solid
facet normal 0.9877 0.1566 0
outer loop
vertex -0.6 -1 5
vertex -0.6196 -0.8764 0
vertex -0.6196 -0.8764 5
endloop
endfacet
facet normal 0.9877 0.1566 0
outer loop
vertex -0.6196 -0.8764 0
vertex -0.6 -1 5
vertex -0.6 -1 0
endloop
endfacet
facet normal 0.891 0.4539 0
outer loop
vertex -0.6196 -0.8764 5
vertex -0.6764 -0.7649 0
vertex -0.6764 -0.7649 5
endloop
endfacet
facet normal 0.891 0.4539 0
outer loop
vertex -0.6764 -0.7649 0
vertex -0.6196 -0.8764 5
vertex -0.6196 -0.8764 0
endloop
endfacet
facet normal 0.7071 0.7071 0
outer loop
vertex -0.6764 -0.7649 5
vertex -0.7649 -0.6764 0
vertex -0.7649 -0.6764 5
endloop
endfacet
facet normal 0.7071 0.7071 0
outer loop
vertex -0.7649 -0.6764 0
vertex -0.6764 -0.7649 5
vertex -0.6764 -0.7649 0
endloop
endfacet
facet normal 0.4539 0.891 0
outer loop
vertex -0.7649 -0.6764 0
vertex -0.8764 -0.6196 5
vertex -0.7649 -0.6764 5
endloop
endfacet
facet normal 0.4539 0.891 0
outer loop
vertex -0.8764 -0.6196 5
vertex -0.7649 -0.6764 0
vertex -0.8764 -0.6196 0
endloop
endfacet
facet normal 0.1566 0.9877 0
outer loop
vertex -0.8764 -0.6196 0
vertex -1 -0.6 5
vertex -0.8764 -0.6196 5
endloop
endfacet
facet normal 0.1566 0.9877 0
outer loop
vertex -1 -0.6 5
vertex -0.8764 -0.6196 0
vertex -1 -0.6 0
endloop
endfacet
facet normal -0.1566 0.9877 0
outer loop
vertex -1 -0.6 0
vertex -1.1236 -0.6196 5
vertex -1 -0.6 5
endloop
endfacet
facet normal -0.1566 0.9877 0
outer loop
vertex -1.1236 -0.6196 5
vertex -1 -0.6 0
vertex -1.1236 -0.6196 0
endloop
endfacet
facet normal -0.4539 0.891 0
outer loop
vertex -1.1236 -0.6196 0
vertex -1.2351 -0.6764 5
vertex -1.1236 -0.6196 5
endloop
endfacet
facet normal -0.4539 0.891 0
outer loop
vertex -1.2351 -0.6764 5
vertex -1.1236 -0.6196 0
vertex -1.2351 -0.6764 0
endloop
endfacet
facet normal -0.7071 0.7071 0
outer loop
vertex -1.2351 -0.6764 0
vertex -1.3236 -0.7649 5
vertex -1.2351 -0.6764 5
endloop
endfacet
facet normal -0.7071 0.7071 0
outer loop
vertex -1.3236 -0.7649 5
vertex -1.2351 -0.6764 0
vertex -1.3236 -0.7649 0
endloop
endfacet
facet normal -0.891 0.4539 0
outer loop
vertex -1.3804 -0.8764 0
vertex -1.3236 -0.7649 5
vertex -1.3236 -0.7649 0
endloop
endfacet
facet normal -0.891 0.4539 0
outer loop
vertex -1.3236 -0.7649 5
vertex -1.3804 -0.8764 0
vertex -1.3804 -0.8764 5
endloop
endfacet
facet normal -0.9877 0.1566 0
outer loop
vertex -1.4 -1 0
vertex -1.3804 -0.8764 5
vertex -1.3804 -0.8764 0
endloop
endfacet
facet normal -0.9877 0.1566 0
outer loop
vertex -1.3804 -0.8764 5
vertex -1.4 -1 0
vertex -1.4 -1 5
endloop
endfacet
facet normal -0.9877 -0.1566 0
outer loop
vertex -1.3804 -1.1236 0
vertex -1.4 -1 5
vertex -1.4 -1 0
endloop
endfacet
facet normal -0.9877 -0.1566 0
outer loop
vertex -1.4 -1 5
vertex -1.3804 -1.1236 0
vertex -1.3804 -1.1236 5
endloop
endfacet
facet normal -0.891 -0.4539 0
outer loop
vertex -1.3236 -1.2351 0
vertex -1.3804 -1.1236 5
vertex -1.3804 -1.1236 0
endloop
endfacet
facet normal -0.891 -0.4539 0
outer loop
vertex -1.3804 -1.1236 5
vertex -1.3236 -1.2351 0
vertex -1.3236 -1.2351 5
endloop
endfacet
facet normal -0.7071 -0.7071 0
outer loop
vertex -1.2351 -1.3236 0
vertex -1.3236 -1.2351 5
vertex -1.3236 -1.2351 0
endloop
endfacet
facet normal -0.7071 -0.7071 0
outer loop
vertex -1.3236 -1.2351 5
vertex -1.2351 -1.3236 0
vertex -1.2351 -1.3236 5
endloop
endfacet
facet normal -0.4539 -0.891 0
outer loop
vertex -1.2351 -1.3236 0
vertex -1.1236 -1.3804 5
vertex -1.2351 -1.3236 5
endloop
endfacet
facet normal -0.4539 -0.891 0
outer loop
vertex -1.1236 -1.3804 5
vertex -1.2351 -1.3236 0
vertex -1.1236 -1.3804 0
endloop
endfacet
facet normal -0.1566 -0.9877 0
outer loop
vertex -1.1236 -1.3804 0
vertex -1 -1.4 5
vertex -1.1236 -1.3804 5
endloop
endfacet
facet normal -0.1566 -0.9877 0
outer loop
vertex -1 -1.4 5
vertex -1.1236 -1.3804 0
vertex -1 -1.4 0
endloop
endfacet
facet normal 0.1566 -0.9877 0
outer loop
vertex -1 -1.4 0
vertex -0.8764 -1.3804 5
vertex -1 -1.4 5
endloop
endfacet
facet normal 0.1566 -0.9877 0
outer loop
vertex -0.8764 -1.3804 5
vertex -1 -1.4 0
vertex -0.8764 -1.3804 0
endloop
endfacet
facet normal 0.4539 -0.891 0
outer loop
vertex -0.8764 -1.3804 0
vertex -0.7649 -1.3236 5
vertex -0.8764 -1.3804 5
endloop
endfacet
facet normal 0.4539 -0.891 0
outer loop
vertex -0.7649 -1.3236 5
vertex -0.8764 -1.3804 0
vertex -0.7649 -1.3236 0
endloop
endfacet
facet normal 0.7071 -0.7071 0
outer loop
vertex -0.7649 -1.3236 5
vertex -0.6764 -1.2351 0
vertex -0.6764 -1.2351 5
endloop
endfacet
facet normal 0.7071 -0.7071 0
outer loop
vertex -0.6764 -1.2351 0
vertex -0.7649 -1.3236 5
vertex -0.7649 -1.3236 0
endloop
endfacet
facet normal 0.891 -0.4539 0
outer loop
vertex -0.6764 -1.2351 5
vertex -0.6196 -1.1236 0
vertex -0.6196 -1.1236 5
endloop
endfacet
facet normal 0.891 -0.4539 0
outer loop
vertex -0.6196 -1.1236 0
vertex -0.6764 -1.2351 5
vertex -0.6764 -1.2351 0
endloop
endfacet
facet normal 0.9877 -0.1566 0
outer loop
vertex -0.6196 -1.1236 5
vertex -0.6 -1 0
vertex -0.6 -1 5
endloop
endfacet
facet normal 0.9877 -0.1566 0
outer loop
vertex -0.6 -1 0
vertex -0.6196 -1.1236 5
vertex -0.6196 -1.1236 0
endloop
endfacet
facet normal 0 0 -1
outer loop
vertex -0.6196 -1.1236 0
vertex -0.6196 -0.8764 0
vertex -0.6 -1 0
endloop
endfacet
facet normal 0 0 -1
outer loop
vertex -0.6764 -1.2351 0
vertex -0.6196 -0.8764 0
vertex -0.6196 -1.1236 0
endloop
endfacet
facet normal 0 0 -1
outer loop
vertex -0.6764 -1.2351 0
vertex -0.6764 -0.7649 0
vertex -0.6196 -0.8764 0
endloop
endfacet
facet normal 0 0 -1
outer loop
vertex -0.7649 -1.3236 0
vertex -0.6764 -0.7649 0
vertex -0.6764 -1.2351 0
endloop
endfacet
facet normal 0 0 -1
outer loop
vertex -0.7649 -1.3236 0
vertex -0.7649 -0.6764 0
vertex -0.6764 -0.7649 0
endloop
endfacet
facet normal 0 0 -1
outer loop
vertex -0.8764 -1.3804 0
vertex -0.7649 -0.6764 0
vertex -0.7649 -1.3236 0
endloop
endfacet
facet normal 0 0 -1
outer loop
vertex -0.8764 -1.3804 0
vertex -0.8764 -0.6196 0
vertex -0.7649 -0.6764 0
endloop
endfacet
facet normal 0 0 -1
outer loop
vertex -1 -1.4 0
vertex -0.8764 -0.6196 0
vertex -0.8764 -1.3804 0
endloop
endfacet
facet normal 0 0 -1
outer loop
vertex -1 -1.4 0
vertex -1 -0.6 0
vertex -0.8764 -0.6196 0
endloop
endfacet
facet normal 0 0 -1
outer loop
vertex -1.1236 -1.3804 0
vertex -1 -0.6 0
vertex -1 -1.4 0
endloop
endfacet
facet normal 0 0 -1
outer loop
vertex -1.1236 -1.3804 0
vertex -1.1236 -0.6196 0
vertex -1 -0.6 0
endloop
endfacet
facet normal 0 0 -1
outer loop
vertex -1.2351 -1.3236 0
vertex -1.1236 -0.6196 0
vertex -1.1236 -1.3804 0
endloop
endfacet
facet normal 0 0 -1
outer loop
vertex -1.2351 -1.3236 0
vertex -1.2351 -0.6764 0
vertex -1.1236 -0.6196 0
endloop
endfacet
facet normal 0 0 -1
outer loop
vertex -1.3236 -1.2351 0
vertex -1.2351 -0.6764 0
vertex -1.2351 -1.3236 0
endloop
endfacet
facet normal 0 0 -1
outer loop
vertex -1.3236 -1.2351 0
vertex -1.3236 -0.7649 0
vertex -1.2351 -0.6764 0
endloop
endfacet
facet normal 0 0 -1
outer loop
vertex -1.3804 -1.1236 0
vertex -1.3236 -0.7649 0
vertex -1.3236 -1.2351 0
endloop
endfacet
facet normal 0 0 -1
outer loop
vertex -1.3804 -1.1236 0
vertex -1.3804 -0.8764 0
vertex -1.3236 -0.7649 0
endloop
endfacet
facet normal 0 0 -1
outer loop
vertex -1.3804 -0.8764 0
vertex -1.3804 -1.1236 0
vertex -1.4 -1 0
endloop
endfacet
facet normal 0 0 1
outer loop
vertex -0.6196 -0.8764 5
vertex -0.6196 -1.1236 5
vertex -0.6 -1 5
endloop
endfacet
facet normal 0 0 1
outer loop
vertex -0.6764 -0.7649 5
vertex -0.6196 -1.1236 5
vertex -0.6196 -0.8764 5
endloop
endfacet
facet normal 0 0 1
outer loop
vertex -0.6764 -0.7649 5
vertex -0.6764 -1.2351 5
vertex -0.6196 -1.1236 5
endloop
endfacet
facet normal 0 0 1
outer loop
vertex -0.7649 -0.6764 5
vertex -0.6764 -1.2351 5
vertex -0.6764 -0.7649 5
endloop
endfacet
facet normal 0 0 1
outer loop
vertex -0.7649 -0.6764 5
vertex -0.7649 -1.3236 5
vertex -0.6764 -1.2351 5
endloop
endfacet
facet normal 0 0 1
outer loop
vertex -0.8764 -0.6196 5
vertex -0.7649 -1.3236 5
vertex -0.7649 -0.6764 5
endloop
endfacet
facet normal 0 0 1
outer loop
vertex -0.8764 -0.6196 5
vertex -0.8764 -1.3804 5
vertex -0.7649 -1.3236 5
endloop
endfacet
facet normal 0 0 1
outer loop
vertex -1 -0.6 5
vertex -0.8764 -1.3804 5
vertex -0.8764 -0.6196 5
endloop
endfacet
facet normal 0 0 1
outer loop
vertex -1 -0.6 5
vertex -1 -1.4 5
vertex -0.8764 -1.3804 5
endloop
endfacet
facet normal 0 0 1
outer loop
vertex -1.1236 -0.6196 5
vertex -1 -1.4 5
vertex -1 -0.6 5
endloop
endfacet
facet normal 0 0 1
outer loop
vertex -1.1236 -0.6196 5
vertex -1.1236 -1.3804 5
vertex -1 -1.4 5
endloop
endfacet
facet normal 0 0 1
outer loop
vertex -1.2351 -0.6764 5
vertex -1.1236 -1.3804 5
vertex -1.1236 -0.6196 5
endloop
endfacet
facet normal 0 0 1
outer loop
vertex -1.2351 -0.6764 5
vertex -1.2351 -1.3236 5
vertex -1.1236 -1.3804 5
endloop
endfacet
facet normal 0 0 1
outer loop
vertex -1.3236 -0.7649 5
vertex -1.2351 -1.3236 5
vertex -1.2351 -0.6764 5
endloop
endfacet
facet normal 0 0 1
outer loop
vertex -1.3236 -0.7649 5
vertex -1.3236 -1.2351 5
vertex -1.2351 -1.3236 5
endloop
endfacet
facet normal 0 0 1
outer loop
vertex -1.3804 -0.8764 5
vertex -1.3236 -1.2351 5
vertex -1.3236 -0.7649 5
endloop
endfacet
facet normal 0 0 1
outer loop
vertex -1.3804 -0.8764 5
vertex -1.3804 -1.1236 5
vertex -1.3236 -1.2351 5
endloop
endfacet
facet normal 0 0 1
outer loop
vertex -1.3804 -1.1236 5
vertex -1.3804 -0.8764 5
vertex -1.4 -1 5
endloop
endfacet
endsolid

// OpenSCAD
$fn = 20;

l = 15;
w = 20;
h = 10;

module BFS (){
	cube([l,w,h]);
}

module PinHole (){
	difference(){
		translate([(l/2)-(.75/2),0,h])cube([.75,2,4]);
		translate([l/2.2,1,h+2.8])rotate([0,90,0])cylinder(d=1,h=2);
	}
}

module AGU (){
	translate([l/4,w/4,h])cube([l/2,w/2,h/3]);
}

module Chute (){
	translate([l/4,w/4,h+h/3])cube([l/2,w/2,h/3]);
}

//BFS(); PinHole();

//AGU();

//Chute();

module fullArm(){

	l = 14;
	w = 3;
	h = 3;

	module leftarm (){
		cube([l,w,h-1]);
		translate([l-4.1,-1,-4])cube([2,3,5]);
	}
	module rightarm (){
		cube([l,w,h-1]);
		translate([l-4.1,1,-4])cube([2,3,5]);
	}
	rightarm();
	translate([0,15,0])leftarm();
	difference(){
		translate([(l-4),0,0])cube([6,18,2]);
		translate([(l-2.5),(15/2)+1,-0.1])cube([3,1,4]);
	}
}

//translate([16.5,-12,h+0.2])rotate([0,0,90])fullArm();

module Pin(){
	cylinder(d=.8,h=5);
}

translate([-1,-1,0])Pin();
